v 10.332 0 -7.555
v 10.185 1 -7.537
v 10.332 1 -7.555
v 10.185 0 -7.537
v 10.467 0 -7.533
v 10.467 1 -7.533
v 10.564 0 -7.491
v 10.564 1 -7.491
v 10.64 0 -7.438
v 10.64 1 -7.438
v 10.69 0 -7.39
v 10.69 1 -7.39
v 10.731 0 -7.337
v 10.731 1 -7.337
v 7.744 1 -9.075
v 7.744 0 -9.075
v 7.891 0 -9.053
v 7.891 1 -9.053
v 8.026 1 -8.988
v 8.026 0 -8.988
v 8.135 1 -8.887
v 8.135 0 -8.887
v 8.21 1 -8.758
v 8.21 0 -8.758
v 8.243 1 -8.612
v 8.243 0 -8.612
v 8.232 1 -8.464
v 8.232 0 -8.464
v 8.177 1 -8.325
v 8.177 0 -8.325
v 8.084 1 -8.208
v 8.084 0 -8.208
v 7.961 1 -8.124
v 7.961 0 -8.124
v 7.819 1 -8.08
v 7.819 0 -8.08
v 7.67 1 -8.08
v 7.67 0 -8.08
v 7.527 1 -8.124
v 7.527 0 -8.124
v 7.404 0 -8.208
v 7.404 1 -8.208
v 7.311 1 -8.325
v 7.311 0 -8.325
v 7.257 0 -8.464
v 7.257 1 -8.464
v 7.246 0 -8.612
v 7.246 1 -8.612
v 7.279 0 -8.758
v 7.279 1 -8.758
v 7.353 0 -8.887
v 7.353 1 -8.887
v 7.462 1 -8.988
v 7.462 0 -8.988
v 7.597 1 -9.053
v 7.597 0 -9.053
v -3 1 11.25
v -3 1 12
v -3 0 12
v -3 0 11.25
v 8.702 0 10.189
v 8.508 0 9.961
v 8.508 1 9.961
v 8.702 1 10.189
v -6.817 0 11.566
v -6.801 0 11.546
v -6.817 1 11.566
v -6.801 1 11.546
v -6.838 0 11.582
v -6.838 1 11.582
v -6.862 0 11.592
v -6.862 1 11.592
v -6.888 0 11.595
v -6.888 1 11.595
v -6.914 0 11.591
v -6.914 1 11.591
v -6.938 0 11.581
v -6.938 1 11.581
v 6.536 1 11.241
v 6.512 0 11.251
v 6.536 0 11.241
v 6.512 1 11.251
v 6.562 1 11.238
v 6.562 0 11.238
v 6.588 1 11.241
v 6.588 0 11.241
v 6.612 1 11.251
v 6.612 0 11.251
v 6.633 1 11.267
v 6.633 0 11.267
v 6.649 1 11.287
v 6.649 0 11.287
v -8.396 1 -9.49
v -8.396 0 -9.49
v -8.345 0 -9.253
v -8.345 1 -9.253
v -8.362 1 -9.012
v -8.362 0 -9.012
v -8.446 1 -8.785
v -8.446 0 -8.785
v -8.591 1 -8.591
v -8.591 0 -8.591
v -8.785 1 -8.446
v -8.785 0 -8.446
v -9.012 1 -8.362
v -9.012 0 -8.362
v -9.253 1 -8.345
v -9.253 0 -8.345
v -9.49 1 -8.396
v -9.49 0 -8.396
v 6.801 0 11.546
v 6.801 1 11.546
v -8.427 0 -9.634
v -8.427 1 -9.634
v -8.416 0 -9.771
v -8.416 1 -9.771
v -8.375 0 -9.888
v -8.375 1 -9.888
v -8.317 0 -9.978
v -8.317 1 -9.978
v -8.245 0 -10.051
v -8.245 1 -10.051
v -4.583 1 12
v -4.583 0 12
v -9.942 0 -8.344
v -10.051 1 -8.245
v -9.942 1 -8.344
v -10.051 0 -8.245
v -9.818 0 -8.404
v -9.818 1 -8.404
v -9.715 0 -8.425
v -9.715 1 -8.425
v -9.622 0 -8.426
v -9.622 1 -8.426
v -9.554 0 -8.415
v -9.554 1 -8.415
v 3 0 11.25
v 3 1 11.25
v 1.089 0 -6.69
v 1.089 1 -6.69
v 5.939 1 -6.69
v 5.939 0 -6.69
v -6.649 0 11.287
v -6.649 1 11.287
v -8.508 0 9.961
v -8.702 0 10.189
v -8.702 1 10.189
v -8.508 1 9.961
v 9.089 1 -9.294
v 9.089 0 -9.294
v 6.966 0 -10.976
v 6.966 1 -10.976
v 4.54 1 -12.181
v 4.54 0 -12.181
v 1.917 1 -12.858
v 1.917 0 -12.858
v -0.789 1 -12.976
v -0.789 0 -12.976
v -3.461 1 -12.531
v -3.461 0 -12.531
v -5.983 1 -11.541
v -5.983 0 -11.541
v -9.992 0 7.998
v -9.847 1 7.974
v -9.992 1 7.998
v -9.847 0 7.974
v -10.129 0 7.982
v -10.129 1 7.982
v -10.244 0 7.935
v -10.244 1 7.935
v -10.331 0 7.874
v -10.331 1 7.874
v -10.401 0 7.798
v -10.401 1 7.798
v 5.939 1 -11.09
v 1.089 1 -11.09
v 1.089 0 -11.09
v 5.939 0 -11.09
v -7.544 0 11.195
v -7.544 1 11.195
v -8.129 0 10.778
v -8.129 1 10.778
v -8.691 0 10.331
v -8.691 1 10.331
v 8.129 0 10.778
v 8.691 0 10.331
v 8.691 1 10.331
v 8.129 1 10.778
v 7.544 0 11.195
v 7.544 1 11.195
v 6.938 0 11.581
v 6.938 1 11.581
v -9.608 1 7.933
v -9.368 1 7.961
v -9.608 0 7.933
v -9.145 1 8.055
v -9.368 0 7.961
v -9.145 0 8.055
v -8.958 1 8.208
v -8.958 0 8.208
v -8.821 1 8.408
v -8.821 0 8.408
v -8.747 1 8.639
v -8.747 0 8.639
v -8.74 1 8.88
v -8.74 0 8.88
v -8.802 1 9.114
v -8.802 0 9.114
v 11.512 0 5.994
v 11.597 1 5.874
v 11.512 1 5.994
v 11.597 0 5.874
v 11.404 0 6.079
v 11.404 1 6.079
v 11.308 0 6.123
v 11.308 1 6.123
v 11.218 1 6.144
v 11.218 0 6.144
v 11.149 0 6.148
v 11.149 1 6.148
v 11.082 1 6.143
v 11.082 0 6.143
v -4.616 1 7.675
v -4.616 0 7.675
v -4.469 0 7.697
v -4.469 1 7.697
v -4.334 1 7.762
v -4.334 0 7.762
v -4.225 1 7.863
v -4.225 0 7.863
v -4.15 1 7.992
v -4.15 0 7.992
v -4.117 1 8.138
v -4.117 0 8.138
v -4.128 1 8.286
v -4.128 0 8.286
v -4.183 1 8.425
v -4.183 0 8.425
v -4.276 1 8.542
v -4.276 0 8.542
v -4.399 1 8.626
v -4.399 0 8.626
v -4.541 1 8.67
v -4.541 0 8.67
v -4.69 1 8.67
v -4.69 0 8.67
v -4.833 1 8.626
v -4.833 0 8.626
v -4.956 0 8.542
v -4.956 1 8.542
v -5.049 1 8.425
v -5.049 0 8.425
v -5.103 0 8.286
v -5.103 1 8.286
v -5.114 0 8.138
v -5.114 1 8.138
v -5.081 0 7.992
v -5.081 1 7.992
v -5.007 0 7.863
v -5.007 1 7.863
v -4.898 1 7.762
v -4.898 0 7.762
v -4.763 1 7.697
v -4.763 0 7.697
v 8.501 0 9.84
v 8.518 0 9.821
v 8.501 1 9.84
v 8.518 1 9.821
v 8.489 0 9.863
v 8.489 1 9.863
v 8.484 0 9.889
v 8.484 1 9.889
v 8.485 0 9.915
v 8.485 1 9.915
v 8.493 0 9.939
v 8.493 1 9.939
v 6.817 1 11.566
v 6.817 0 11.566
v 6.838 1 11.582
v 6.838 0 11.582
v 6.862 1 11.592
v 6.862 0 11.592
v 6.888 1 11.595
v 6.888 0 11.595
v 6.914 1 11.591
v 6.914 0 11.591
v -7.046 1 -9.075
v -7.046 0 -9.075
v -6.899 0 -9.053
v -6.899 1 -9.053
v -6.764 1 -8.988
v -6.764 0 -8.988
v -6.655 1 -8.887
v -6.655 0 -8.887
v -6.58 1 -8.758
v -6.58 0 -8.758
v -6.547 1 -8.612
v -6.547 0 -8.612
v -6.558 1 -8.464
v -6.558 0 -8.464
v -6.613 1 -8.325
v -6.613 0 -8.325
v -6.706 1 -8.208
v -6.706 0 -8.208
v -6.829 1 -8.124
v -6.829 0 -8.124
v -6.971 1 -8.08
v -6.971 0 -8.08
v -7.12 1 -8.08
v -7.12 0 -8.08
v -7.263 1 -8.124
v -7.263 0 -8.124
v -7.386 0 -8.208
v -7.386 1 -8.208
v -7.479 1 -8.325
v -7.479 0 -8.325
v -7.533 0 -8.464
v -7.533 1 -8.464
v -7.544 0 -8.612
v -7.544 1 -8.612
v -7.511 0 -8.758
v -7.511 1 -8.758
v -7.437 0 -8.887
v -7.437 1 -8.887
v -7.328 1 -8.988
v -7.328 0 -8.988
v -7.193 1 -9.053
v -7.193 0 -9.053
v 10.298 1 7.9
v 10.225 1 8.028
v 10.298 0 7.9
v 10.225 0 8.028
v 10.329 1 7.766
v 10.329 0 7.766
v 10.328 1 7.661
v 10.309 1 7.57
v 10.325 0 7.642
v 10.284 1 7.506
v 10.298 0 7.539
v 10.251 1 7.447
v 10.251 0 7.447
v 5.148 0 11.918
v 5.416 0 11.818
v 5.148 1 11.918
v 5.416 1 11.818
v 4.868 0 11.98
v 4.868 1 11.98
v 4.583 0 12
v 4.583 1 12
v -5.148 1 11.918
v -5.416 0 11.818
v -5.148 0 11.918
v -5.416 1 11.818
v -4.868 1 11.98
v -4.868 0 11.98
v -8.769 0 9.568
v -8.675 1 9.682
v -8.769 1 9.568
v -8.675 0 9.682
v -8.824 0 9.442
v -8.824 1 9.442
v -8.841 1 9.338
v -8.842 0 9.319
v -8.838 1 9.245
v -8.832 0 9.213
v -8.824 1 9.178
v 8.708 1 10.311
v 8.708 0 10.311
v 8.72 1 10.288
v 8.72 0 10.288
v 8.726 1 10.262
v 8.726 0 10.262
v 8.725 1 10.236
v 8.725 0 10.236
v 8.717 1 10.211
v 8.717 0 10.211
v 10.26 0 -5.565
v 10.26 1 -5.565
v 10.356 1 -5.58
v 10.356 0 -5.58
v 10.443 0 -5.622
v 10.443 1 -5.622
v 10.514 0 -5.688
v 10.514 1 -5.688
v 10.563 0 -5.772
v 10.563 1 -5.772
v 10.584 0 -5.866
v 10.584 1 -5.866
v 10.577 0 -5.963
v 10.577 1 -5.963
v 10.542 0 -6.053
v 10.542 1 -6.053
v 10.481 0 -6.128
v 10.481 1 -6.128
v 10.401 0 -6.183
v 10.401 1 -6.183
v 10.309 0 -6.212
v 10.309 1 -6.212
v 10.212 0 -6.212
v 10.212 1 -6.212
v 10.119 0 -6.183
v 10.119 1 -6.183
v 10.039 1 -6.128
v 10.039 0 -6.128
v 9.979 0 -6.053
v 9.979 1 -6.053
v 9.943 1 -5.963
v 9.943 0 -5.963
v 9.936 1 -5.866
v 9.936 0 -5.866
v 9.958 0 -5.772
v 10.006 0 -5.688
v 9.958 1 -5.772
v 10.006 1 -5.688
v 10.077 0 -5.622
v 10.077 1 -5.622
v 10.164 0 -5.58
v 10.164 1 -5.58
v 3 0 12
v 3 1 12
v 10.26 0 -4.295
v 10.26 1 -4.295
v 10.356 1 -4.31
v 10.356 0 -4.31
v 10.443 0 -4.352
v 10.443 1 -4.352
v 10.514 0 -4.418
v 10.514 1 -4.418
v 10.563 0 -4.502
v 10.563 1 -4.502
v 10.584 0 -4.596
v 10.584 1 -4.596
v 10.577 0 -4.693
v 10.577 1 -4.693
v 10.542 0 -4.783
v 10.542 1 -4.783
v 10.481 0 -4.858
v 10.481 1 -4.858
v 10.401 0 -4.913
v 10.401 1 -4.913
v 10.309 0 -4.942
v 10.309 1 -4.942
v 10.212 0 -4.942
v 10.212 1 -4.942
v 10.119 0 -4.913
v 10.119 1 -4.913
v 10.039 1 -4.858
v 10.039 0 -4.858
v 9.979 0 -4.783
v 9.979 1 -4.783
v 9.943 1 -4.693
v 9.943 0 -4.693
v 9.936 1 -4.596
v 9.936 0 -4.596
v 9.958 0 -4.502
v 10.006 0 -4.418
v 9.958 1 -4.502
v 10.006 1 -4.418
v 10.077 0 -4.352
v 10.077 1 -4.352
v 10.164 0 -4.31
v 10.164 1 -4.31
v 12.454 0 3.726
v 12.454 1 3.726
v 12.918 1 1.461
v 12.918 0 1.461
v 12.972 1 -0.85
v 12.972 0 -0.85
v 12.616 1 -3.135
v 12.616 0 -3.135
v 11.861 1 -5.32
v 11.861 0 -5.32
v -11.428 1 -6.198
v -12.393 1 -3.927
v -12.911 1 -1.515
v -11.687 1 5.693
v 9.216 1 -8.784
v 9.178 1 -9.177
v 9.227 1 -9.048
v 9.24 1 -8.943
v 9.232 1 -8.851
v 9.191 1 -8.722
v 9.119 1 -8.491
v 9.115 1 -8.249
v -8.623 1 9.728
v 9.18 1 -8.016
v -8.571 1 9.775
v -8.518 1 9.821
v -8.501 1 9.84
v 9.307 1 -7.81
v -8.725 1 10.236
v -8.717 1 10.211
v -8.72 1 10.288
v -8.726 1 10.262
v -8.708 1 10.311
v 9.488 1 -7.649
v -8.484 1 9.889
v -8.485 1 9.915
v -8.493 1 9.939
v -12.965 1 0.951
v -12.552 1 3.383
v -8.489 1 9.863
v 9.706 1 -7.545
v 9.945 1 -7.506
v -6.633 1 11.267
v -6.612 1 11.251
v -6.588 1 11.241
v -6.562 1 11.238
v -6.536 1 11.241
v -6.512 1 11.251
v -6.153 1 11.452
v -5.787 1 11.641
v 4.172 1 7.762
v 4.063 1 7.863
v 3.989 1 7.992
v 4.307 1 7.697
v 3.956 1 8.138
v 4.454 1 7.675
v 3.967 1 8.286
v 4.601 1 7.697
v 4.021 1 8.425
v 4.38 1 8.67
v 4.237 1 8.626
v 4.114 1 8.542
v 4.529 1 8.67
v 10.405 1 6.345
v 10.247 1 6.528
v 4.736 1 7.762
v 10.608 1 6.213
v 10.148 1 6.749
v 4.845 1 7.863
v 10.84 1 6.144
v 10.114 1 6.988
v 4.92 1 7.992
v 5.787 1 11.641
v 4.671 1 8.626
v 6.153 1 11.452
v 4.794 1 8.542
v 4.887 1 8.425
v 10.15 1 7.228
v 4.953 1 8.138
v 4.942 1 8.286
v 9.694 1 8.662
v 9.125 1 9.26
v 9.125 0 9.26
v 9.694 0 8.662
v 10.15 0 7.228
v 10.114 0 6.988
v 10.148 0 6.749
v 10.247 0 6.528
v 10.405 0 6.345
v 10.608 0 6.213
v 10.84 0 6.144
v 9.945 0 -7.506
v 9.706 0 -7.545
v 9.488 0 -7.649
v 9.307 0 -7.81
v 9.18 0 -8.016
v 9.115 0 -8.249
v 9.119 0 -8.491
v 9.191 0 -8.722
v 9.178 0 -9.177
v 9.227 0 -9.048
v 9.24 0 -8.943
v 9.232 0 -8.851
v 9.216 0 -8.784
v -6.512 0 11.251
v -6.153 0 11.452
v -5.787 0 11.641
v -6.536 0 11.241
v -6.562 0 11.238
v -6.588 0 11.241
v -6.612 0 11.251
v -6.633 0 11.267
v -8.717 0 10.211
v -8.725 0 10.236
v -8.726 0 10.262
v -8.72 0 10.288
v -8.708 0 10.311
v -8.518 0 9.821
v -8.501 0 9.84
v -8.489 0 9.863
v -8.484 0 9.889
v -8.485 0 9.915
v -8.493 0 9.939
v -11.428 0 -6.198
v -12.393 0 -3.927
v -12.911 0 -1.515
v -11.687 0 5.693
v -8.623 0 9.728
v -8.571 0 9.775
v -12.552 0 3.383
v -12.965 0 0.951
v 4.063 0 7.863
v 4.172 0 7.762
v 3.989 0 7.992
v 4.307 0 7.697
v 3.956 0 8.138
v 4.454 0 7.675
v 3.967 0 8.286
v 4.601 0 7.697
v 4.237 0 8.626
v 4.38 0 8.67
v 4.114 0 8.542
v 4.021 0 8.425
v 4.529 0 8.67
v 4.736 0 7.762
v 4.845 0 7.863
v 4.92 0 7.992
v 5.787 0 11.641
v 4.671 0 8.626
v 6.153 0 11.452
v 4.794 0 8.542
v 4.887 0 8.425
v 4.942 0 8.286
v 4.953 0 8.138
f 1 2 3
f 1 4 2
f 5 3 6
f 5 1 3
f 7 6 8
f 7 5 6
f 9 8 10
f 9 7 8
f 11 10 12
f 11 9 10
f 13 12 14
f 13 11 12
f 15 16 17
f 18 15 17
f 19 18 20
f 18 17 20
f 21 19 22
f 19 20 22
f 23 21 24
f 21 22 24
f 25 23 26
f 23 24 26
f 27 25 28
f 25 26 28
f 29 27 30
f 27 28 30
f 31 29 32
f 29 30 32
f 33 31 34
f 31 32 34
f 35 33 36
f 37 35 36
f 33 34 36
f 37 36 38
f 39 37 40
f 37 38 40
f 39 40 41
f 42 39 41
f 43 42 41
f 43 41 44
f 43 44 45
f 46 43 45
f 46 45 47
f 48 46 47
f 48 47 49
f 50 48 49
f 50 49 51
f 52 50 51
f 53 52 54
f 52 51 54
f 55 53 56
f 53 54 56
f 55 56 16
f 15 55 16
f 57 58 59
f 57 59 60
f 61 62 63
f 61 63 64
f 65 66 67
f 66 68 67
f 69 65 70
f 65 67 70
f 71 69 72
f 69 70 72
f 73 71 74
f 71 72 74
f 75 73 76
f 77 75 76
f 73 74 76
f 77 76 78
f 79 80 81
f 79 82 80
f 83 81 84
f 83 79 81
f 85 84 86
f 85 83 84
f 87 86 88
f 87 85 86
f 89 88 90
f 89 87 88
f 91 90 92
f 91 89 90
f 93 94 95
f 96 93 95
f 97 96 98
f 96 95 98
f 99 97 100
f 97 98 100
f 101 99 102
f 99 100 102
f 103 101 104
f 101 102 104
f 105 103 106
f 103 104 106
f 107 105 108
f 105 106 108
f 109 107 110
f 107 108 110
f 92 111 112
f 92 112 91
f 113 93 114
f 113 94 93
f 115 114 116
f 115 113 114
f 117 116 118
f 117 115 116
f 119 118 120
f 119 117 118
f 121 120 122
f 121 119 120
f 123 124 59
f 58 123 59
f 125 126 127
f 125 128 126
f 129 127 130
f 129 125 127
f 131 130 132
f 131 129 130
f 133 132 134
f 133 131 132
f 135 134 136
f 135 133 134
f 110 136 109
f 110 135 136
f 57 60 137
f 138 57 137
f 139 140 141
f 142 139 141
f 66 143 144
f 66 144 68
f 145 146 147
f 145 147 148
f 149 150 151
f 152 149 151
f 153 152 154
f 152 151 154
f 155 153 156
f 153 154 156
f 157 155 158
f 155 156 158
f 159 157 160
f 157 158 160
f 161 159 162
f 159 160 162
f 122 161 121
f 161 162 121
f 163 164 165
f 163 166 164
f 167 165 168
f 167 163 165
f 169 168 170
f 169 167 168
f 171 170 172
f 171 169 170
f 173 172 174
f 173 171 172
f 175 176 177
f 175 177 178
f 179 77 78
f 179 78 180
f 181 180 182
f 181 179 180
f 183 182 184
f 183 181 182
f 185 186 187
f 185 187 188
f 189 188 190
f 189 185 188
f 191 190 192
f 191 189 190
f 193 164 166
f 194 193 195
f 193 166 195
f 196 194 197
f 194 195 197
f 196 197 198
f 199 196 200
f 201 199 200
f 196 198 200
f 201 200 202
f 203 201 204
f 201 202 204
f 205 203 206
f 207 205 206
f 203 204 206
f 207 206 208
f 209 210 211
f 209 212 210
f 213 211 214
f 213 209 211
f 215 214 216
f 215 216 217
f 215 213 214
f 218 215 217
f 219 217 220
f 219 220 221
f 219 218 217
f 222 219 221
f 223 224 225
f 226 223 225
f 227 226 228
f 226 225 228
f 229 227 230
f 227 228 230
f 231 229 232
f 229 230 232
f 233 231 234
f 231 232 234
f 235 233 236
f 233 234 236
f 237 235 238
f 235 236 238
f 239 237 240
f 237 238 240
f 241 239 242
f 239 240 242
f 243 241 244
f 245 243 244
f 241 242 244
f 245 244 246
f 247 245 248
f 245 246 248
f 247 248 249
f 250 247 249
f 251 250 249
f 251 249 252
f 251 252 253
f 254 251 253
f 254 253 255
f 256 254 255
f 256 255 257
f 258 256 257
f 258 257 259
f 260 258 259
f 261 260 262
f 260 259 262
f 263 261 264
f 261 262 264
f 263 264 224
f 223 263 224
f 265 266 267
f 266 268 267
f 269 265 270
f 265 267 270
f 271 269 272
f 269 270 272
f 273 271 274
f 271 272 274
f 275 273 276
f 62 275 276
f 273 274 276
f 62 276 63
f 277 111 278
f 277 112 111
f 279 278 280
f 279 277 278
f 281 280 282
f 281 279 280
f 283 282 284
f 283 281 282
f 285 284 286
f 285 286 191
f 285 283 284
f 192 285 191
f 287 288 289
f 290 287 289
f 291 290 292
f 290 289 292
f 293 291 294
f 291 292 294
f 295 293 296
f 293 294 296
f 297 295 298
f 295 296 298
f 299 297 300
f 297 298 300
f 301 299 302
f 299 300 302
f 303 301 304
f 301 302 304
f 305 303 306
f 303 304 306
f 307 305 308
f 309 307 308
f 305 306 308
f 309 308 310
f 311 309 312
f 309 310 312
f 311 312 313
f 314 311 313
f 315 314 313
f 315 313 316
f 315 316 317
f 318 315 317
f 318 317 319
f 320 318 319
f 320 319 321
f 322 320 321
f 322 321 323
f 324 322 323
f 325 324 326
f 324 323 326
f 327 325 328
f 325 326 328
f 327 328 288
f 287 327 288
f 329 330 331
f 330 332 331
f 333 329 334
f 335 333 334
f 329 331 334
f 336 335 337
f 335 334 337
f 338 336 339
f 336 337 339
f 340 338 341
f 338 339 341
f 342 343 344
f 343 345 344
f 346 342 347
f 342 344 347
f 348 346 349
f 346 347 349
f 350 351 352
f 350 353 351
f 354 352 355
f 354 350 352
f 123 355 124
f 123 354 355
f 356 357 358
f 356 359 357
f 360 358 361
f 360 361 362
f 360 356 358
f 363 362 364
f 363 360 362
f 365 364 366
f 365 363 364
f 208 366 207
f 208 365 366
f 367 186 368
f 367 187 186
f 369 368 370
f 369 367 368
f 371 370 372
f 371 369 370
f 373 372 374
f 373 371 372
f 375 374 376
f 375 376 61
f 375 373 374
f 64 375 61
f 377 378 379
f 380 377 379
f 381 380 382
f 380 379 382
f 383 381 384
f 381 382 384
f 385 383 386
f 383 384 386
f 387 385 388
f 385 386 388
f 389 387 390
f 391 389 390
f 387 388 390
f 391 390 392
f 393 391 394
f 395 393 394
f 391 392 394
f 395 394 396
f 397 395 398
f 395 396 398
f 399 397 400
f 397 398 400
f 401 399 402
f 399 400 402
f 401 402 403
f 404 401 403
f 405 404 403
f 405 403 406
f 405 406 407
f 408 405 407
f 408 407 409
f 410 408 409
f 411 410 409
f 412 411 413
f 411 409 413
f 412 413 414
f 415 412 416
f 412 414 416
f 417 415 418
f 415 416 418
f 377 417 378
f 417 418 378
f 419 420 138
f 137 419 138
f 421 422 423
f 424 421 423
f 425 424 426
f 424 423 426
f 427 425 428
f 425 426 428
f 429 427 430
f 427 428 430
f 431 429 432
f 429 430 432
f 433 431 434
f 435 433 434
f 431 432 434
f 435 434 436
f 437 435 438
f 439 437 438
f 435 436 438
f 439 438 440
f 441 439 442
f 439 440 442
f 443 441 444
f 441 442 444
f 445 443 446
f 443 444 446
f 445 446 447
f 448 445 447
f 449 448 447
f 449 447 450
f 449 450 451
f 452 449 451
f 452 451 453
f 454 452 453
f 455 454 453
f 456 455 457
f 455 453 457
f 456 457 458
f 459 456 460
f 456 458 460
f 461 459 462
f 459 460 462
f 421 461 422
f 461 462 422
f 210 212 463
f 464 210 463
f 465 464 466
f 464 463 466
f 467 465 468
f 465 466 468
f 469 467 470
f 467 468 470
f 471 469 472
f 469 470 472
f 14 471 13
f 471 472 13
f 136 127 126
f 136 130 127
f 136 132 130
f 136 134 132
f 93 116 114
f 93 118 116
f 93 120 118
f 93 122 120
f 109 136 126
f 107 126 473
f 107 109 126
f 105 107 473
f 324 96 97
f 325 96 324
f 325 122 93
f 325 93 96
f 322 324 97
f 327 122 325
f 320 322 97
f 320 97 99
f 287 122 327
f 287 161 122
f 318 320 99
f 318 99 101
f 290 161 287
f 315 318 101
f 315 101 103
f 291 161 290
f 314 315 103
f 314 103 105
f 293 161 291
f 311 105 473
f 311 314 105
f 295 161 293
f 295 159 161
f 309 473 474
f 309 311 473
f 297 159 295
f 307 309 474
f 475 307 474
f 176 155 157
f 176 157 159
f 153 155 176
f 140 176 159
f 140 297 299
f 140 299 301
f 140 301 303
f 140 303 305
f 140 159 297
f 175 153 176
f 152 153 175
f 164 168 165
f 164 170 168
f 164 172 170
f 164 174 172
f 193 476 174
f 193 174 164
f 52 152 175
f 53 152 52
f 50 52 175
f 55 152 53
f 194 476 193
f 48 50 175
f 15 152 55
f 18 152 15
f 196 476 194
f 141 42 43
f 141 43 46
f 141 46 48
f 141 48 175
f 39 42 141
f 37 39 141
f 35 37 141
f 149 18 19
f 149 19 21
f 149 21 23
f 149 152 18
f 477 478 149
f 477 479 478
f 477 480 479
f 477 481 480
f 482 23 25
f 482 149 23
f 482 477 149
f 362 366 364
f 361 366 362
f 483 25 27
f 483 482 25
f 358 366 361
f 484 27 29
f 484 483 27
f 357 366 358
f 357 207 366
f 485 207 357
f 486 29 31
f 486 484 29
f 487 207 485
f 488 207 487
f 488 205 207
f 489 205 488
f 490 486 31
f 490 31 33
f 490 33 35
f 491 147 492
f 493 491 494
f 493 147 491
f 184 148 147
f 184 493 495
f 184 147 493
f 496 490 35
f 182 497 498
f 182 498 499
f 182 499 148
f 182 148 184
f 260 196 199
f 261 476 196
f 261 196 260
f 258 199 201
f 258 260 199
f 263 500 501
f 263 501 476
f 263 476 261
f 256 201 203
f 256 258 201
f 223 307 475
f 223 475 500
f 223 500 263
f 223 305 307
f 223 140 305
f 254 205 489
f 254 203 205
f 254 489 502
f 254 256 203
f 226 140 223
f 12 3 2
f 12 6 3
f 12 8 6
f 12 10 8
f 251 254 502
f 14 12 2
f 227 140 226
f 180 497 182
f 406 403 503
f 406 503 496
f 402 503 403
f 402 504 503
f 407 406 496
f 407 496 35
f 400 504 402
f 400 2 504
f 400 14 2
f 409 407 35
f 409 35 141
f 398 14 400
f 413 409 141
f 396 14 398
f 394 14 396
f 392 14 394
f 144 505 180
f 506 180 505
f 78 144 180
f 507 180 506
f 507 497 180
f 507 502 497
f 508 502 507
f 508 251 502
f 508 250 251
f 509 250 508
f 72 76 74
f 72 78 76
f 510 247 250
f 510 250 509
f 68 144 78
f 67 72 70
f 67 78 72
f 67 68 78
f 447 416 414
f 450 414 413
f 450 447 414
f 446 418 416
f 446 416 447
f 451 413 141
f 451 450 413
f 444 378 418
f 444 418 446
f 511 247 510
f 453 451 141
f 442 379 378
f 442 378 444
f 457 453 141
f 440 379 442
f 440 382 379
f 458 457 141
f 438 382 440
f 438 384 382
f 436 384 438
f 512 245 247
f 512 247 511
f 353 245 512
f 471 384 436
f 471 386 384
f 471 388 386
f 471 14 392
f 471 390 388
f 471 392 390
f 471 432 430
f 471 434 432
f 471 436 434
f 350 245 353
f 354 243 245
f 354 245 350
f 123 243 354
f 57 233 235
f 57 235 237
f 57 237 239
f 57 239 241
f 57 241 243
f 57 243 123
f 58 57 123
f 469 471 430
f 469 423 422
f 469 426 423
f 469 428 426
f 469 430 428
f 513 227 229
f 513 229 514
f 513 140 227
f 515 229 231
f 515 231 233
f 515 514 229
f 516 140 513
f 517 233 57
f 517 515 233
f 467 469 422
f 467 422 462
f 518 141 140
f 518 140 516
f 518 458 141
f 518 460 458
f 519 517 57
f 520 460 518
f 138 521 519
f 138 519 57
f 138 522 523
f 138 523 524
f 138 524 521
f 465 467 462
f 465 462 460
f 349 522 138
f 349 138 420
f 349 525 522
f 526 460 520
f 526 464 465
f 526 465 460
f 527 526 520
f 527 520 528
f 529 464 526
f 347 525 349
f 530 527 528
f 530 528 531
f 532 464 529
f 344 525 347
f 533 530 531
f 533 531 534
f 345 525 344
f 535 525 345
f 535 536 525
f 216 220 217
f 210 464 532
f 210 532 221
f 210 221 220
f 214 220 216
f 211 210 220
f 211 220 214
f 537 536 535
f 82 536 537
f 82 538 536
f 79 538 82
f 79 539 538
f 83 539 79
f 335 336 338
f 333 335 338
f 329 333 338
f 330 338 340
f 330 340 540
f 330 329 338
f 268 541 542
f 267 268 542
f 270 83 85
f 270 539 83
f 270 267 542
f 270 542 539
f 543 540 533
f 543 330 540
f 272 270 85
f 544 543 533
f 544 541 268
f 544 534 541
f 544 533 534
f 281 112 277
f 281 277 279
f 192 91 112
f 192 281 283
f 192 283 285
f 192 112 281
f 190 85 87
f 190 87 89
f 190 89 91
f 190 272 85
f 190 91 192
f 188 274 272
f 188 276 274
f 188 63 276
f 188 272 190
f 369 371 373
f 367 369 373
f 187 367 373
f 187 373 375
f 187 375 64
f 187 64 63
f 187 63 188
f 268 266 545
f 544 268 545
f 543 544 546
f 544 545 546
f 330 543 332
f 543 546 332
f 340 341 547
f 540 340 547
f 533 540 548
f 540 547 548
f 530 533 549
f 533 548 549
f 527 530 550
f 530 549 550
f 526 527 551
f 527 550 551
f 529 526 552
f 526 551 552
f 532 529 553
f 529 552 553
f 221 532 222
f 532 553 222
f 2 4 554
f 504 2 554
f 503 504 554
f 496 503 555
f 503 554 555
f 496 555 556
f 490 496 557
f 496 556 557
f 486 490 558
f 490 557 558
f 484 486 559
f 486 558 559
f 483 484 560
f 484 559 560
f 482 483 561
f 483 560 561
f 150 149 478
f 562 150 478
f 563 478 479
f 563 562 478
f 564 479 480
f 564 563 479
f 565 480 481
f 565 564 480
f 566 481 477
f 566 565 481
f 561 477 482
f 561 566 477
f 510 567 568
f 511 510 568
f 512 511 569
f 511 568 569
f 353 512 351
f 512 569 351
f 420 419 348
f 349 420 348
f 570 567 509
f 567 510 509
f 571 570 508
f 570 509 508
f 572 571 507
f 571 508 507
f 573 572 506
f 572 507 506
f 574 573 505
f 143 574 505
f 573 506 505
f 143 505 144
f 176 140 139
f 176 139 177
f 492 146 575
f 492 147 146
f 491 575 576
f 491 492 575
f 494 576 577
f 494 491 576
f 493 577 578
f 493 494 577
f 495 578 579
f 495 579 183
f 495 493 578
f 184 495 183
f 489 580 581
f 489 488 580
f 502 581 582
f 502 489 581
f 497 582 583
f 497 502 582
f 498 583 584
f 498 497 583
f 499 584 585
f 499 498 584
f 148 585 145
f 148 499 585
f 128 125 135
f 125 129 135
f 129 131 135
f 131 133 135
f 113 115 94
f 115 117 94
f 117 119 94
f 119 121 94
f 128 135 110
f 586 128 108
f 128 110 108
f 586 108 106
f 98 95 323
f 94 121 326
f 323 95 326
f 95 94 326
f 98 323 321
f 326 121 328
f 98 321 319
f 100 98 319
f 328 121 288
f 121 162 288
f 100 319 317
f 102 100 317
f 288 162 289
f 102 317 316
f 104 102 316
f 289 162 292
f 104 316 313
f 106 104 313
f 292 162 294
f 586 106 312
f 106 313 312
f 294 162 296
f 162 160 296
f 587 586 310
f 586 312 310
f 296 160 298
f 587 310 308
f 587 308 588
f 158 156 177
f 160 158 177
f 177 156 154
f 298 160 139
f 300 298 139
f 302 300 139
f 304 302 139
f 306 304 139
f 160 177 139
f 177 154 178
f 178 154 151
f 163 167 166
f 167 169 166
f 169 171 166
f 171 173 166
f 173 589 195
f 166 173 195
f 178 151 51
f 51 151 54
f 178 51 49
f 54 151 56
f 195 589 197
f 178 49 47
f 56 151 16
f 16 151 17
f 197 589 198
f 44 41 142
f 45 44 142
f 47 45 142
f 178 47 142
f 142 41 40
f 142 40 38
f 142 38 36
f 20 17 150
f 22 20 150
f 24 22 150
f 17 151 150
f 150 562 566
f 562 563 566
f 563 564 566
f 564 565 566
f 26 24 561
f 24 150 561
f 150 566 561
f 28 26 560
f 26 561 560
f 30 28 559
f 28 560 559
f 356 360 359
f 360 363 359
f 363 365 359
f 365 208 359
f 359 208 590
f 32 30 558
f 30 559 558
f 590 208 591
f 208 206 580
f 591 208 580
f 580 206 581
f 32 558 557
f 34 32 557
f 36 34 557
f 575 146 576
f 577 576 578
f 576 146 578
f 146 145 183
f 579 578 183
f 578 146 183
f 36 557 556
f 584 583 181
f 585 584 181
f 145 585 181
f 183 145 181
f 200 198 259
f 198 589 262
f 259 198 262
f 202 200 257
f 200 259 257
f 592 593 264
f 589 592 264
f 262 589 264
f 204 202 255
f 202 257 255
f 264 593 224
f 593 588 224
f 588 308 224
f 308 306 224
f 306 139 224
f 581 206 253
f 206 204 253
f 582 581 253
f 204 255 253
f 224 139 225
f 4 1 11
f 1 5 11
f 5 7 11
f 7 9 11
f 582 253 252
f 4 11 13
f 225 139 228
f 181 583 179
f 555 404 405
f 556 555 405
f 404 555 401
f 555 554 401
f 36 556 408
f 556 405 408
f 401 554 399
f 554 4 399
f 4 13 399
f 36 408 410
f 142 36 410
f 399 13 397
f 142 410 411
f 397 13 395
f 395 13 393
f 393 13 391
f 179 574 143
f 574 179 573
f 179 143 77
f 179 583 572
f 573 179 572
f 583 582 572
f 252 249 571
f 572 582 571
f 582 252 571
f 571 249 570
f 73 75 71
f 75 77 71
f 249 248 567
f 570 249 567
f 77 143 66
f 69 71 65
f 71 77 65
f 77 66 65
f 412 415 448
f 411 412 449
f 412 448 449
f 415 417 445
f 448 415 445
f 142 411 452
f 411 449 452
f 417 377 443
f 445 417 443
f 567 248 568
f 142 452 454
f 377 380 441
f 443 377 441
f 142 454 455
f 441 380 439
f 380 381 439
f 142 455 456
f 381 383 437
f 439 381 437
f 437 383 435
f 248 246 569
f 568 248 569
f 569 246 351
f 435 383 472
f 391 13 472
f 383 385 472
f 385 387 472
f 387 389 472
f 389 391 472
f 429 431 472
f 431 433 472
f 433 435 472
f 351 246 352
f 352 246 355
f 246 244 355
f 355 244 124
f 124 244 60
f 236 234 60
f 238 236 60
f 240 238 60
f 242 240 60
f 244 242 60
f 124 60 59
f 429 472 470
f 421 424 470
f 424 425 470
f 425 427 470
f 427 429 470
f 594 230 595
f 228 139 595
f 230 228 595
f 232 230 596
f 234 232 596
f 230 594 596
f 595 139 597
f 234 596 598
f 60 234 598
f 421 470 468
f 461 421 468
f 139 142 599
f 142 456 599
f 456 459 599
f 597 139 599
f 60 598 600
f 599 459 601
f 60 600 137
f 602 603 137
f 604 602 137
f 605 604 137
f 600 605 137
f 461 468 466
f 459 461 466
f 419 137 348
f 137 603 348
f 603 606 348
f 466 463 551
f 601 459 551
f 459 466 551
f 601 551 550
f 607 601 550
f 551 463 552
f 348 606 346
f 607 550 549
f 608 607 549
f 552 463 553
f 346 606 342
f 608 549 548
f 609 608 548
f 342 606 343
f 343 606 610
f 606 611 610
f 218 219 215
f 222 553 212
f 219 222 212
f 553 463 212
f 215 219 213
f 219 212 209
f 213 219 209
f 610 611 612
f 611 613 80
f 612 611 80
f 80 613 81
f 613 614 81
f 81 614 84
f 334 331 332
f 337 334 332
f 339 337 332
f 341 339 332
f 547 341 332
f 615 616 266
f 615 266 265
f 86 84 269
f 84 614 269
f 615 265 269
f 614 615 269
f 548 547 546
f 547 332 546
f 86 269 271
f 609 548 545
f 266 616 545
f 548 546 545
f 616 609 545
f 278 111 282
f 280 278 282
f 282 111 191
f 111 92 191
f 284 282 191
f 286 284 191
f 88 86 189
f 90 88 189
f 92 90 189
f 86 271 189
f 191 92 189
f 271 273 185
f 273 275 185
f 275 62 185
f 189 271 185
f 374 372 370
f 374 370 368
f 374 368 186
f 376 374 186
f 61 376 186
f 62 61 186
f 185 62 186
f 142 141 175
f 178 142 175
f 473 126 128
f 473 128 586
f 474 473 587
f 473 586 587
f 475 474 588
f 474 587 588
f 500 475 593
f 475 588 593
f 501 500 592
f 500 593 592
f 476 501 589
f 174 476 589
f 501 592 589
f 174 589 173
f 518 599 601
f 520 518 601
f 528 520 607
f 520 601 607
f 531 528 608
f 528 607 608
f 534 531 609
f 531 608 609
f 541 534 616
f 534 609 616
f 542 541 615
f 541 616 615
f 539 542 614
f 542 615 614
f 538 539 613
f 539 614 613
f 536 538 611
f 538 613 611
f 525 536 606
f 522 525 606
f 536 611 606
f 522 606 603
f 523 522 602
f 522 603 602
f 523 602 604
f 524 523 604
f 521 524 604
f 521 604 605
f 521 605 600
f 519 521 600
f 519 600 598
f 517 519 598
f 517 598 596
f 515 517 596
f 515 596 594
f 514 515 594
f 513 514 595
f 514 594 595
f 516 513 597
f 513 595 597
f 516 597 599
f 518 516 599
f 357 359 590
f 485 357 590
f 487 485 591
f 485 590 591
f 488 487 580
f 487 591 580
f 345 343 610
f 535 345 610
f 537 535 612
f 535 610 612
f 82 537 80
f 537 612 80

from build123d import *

# Parameters (mm, degrees)
SKETCH1_R               = 13
BOSS_EXTRUDE1_DEPTH     = 1
CUT_EXTRUDE2_DEPTH      = 1
FILLET1_R               = 2
SKETCH4_R               = 0.5
CUT_EXTRUDE3_DEPTH      = 1
SKETCH6_R               = 0.85
CUT_EXTRUDE4_DEPTH      = 10
FILLET2_R               = 0.5
BOSS_EXTRUDE4_START     = -1
BOSS_EXTRUDE4_DEPTH     = 1
FILLET4_R               = 0.1
CUT_EXTRUDE6_DEPTH      = 19.411952786
CUT_EXTRUDE6_DEPTH_BACK = 19.411952786
SKETCH11_W              = 6
SKETCH11_H              = 1.5
SKETCH13_R              = 0.325
SKETCH13_W              = 4.85
SKETCH13_H              = 4.4
CUT_EXTRUDE7_DEPTH      = 1


with BuildPart() as part:
    # Sketch1 → Boss-Extrude1 (new body)
    with BuildSketch(Plane(origin=(0, 0, 0), x_dir=(1, 0, 0), z_dir=(0, 1, 0))):
        with Locations(Location((0, 0, 0), (0, 0, 270))):
            Circle(SKETCH1_R)
    extrude(amount=BOSS_EXTRUDE1_DEPTH)

    # Sketch3 → Cut-Extrude2 (cut)
    with BuildSketch(Plane(origin=(0, 0, 0), x_dir=(1, 0, 0), z_dir=(0, 1, 0))):
        with BuildLine():
            Line((-5, -12), (5, -12))
            ThreePointArc((5, -12), (0, -13), (-5, -12))
        make_face()
    extrude(amount=CUT_EXTRUDE2_DEPTH, mode=Mode.SUBTRACT)

    # Fillet1
    fillet1_edges = [part.edges().sort_by_distance(p)[0] for p in [
        (-5, 0.5, 12),
        (5, 0.5, 12),
    ]]
    fillet(fillet1_edges, radius=FILLET1_R)

    # Sketch4 → Cut-Extrude3 (cut)
    with BuildSketch(Plane.XZ):
        with Locations(Location((4.45412, 8.175151, 0), (0, 0, 270))):
            Circle(SKETCH4_R)
        with Locations(Location((-4.61588, 8.175151, 0), (0, 0, 270))):
            Circle(SKETCH4_R)
        with Locations(Location((-7.04588, -8.574849, 0), (0, 0, 270))):
            Circle(SKETCH4_R)
        with Locations(Location((7.74412, -8.574849, 0), (0, 0, 270))):
            Circle(SKETCH4_R)
    extrude(amount=-CUT_EXTRUDE3_DEPTH, mode=Mode.SUBTRACT)

    # Sketch6 → Cut-Extrude4 (cut)
    with BuildSketch(Plane.XZ):
        with Locations((9.958577761, -8.356238926)):
            Circle(SKETCH6_R)
        with Locations((-9.584605379, 8.782672699)):
            Circle(SKETCH6_R)
        with Locations((-9.192388155, -9.192388155)):
            Circle(SKETCH6_R)
        with Locations((10.964088796, 6.984894909)):
            Circle(SKETCH6_R)
    extrude(amount=-CUT_EXTRUDE4_DEPTH, mode=Mode.SUBTRACT)

    # Fillet2
    fillet2_edges = [part.edges().sort_by_distance(p)[0] for p in [
        (10.484191703, 0.5, 7.686463708),
        (11.397112787, 0.5, 6.25346465),
        (-10.138062294, 0.5, 8.137548337),
        (-8.990172858, 0.5, 9.390249836),
        (-8.57201926, 0.5, -9.773458232),
        (-9.773458232, 0.5, -8.57201926),
        (10.483367978, 0.5, -7.687587127),
        (9.39121315, 0.5, -8.989166567),
    ]]
    fillet(fillet2_edges, radius=FILLET2_R)

    # Sketch10 → Boss-Extrude4 (add)
    with BuildSketch(Plane(origin=(0, 1, 0), x_dir=(1, 0, 0), z_dir=(0, 1, 0)).offset(BOSS_EXTRUDE4_START)):
        with BuildLine():
            Line((-6.597998718, -11.201179086), (-6.8517679, -11.631993666))
            ThreePointArc((-6.8517679, -11.631993666), (-7.839489902, -10.990559498), (-8.767548652, -10.265480536))
            Line((-8.767548652, -10.265480536), (-8.442824628, -9.885277553))
            ThreePointArc((-8.442824628, -9.885277553), (-7.549138424, -10.583501739), (-6.597998718, -11.201179086))
        make_face()
        with BuildLine():
            Line((8.442824628, -9.885277553), (8.767548652, -10.265480536))
            ThreePointArc((8.767548652, -10.265480536), (7.839489902, -10.990559498), (6.8517679, -11.631993666))
            Line((6.8517679, -11.631993666), (6.597998718, -11.201179086))
            ThreePointArc((6.597998718, -11.201179086), (7.549138424, -10.583501739), (8.442824628, -9.885277553))
        make_face()
    extrude(amount=BOSS_EXTRUDE4_DEPTH)

    # Fillet4
    fillet4_edges = [part.edges().sort_by_distance(p)[0] for p in [
        (-8.442824628, 0.5, 9.885277553),
        (-6.597998718, 0.5, 11.201179086),
        (-6.8517679, 0.5, 11.631993666),
        (-8.767548652, 0.5, 10.265480536),
        (6.597998718, 0.5, 11.201179086),
        (8.442824628, 0.5, 9.885277553),
        (8.767548652, 0.5, 10.265480536),
        (6.8517679, 0.5, 11.631993666),
    ]]
    fillet(fillet4_edges, radius=FILLET4_R)

    # Sketch11 → Cut-Extrude6 (cut, two sides: drawn at the far end of the back side and taken through both)
    with BuildSketch(Plane(origin=(0, 0, 0), x_dir=(1, 0, 0), z_dir=(0, 1, 0)).offset(-CUT_EXTRUDE6_DEPTH_BACK)):
        with Locations((0, -12)):
            Rectangle(SKETCH11_W, SKETCH11_H)
    extrude(amount=CUT_EXTRUDE6_DEPTH + CUT_EXTRUDE6_DEPTH_BACK, mode=Mode.SUBTRACT)

    # Sketch13 → Cut-Extrude7 (cut)
    with BuildSketch(Plane(origin=(0, 1, 0), x_dir=(1, 0, 0), z_dir=(0, 1, 0))):
        with Locations(Location((10.26011, 4.62025, 0), (0, 0, 270))):
            Circle(SKETCH13_R)
        with Locations(Location((10.26011, 5.89025, 0), (0, 0, 270))):
            Circle(SKETCH13_R)
        with Locations((3.51412, 8.889849)):
            Rectangle(SKETCH13_W, SKETCH13_H)
    extrude(amount=-CUT_EXTRUDE7_DEPTH, mode=Mode.SUBTRACT)


solid = part.part
